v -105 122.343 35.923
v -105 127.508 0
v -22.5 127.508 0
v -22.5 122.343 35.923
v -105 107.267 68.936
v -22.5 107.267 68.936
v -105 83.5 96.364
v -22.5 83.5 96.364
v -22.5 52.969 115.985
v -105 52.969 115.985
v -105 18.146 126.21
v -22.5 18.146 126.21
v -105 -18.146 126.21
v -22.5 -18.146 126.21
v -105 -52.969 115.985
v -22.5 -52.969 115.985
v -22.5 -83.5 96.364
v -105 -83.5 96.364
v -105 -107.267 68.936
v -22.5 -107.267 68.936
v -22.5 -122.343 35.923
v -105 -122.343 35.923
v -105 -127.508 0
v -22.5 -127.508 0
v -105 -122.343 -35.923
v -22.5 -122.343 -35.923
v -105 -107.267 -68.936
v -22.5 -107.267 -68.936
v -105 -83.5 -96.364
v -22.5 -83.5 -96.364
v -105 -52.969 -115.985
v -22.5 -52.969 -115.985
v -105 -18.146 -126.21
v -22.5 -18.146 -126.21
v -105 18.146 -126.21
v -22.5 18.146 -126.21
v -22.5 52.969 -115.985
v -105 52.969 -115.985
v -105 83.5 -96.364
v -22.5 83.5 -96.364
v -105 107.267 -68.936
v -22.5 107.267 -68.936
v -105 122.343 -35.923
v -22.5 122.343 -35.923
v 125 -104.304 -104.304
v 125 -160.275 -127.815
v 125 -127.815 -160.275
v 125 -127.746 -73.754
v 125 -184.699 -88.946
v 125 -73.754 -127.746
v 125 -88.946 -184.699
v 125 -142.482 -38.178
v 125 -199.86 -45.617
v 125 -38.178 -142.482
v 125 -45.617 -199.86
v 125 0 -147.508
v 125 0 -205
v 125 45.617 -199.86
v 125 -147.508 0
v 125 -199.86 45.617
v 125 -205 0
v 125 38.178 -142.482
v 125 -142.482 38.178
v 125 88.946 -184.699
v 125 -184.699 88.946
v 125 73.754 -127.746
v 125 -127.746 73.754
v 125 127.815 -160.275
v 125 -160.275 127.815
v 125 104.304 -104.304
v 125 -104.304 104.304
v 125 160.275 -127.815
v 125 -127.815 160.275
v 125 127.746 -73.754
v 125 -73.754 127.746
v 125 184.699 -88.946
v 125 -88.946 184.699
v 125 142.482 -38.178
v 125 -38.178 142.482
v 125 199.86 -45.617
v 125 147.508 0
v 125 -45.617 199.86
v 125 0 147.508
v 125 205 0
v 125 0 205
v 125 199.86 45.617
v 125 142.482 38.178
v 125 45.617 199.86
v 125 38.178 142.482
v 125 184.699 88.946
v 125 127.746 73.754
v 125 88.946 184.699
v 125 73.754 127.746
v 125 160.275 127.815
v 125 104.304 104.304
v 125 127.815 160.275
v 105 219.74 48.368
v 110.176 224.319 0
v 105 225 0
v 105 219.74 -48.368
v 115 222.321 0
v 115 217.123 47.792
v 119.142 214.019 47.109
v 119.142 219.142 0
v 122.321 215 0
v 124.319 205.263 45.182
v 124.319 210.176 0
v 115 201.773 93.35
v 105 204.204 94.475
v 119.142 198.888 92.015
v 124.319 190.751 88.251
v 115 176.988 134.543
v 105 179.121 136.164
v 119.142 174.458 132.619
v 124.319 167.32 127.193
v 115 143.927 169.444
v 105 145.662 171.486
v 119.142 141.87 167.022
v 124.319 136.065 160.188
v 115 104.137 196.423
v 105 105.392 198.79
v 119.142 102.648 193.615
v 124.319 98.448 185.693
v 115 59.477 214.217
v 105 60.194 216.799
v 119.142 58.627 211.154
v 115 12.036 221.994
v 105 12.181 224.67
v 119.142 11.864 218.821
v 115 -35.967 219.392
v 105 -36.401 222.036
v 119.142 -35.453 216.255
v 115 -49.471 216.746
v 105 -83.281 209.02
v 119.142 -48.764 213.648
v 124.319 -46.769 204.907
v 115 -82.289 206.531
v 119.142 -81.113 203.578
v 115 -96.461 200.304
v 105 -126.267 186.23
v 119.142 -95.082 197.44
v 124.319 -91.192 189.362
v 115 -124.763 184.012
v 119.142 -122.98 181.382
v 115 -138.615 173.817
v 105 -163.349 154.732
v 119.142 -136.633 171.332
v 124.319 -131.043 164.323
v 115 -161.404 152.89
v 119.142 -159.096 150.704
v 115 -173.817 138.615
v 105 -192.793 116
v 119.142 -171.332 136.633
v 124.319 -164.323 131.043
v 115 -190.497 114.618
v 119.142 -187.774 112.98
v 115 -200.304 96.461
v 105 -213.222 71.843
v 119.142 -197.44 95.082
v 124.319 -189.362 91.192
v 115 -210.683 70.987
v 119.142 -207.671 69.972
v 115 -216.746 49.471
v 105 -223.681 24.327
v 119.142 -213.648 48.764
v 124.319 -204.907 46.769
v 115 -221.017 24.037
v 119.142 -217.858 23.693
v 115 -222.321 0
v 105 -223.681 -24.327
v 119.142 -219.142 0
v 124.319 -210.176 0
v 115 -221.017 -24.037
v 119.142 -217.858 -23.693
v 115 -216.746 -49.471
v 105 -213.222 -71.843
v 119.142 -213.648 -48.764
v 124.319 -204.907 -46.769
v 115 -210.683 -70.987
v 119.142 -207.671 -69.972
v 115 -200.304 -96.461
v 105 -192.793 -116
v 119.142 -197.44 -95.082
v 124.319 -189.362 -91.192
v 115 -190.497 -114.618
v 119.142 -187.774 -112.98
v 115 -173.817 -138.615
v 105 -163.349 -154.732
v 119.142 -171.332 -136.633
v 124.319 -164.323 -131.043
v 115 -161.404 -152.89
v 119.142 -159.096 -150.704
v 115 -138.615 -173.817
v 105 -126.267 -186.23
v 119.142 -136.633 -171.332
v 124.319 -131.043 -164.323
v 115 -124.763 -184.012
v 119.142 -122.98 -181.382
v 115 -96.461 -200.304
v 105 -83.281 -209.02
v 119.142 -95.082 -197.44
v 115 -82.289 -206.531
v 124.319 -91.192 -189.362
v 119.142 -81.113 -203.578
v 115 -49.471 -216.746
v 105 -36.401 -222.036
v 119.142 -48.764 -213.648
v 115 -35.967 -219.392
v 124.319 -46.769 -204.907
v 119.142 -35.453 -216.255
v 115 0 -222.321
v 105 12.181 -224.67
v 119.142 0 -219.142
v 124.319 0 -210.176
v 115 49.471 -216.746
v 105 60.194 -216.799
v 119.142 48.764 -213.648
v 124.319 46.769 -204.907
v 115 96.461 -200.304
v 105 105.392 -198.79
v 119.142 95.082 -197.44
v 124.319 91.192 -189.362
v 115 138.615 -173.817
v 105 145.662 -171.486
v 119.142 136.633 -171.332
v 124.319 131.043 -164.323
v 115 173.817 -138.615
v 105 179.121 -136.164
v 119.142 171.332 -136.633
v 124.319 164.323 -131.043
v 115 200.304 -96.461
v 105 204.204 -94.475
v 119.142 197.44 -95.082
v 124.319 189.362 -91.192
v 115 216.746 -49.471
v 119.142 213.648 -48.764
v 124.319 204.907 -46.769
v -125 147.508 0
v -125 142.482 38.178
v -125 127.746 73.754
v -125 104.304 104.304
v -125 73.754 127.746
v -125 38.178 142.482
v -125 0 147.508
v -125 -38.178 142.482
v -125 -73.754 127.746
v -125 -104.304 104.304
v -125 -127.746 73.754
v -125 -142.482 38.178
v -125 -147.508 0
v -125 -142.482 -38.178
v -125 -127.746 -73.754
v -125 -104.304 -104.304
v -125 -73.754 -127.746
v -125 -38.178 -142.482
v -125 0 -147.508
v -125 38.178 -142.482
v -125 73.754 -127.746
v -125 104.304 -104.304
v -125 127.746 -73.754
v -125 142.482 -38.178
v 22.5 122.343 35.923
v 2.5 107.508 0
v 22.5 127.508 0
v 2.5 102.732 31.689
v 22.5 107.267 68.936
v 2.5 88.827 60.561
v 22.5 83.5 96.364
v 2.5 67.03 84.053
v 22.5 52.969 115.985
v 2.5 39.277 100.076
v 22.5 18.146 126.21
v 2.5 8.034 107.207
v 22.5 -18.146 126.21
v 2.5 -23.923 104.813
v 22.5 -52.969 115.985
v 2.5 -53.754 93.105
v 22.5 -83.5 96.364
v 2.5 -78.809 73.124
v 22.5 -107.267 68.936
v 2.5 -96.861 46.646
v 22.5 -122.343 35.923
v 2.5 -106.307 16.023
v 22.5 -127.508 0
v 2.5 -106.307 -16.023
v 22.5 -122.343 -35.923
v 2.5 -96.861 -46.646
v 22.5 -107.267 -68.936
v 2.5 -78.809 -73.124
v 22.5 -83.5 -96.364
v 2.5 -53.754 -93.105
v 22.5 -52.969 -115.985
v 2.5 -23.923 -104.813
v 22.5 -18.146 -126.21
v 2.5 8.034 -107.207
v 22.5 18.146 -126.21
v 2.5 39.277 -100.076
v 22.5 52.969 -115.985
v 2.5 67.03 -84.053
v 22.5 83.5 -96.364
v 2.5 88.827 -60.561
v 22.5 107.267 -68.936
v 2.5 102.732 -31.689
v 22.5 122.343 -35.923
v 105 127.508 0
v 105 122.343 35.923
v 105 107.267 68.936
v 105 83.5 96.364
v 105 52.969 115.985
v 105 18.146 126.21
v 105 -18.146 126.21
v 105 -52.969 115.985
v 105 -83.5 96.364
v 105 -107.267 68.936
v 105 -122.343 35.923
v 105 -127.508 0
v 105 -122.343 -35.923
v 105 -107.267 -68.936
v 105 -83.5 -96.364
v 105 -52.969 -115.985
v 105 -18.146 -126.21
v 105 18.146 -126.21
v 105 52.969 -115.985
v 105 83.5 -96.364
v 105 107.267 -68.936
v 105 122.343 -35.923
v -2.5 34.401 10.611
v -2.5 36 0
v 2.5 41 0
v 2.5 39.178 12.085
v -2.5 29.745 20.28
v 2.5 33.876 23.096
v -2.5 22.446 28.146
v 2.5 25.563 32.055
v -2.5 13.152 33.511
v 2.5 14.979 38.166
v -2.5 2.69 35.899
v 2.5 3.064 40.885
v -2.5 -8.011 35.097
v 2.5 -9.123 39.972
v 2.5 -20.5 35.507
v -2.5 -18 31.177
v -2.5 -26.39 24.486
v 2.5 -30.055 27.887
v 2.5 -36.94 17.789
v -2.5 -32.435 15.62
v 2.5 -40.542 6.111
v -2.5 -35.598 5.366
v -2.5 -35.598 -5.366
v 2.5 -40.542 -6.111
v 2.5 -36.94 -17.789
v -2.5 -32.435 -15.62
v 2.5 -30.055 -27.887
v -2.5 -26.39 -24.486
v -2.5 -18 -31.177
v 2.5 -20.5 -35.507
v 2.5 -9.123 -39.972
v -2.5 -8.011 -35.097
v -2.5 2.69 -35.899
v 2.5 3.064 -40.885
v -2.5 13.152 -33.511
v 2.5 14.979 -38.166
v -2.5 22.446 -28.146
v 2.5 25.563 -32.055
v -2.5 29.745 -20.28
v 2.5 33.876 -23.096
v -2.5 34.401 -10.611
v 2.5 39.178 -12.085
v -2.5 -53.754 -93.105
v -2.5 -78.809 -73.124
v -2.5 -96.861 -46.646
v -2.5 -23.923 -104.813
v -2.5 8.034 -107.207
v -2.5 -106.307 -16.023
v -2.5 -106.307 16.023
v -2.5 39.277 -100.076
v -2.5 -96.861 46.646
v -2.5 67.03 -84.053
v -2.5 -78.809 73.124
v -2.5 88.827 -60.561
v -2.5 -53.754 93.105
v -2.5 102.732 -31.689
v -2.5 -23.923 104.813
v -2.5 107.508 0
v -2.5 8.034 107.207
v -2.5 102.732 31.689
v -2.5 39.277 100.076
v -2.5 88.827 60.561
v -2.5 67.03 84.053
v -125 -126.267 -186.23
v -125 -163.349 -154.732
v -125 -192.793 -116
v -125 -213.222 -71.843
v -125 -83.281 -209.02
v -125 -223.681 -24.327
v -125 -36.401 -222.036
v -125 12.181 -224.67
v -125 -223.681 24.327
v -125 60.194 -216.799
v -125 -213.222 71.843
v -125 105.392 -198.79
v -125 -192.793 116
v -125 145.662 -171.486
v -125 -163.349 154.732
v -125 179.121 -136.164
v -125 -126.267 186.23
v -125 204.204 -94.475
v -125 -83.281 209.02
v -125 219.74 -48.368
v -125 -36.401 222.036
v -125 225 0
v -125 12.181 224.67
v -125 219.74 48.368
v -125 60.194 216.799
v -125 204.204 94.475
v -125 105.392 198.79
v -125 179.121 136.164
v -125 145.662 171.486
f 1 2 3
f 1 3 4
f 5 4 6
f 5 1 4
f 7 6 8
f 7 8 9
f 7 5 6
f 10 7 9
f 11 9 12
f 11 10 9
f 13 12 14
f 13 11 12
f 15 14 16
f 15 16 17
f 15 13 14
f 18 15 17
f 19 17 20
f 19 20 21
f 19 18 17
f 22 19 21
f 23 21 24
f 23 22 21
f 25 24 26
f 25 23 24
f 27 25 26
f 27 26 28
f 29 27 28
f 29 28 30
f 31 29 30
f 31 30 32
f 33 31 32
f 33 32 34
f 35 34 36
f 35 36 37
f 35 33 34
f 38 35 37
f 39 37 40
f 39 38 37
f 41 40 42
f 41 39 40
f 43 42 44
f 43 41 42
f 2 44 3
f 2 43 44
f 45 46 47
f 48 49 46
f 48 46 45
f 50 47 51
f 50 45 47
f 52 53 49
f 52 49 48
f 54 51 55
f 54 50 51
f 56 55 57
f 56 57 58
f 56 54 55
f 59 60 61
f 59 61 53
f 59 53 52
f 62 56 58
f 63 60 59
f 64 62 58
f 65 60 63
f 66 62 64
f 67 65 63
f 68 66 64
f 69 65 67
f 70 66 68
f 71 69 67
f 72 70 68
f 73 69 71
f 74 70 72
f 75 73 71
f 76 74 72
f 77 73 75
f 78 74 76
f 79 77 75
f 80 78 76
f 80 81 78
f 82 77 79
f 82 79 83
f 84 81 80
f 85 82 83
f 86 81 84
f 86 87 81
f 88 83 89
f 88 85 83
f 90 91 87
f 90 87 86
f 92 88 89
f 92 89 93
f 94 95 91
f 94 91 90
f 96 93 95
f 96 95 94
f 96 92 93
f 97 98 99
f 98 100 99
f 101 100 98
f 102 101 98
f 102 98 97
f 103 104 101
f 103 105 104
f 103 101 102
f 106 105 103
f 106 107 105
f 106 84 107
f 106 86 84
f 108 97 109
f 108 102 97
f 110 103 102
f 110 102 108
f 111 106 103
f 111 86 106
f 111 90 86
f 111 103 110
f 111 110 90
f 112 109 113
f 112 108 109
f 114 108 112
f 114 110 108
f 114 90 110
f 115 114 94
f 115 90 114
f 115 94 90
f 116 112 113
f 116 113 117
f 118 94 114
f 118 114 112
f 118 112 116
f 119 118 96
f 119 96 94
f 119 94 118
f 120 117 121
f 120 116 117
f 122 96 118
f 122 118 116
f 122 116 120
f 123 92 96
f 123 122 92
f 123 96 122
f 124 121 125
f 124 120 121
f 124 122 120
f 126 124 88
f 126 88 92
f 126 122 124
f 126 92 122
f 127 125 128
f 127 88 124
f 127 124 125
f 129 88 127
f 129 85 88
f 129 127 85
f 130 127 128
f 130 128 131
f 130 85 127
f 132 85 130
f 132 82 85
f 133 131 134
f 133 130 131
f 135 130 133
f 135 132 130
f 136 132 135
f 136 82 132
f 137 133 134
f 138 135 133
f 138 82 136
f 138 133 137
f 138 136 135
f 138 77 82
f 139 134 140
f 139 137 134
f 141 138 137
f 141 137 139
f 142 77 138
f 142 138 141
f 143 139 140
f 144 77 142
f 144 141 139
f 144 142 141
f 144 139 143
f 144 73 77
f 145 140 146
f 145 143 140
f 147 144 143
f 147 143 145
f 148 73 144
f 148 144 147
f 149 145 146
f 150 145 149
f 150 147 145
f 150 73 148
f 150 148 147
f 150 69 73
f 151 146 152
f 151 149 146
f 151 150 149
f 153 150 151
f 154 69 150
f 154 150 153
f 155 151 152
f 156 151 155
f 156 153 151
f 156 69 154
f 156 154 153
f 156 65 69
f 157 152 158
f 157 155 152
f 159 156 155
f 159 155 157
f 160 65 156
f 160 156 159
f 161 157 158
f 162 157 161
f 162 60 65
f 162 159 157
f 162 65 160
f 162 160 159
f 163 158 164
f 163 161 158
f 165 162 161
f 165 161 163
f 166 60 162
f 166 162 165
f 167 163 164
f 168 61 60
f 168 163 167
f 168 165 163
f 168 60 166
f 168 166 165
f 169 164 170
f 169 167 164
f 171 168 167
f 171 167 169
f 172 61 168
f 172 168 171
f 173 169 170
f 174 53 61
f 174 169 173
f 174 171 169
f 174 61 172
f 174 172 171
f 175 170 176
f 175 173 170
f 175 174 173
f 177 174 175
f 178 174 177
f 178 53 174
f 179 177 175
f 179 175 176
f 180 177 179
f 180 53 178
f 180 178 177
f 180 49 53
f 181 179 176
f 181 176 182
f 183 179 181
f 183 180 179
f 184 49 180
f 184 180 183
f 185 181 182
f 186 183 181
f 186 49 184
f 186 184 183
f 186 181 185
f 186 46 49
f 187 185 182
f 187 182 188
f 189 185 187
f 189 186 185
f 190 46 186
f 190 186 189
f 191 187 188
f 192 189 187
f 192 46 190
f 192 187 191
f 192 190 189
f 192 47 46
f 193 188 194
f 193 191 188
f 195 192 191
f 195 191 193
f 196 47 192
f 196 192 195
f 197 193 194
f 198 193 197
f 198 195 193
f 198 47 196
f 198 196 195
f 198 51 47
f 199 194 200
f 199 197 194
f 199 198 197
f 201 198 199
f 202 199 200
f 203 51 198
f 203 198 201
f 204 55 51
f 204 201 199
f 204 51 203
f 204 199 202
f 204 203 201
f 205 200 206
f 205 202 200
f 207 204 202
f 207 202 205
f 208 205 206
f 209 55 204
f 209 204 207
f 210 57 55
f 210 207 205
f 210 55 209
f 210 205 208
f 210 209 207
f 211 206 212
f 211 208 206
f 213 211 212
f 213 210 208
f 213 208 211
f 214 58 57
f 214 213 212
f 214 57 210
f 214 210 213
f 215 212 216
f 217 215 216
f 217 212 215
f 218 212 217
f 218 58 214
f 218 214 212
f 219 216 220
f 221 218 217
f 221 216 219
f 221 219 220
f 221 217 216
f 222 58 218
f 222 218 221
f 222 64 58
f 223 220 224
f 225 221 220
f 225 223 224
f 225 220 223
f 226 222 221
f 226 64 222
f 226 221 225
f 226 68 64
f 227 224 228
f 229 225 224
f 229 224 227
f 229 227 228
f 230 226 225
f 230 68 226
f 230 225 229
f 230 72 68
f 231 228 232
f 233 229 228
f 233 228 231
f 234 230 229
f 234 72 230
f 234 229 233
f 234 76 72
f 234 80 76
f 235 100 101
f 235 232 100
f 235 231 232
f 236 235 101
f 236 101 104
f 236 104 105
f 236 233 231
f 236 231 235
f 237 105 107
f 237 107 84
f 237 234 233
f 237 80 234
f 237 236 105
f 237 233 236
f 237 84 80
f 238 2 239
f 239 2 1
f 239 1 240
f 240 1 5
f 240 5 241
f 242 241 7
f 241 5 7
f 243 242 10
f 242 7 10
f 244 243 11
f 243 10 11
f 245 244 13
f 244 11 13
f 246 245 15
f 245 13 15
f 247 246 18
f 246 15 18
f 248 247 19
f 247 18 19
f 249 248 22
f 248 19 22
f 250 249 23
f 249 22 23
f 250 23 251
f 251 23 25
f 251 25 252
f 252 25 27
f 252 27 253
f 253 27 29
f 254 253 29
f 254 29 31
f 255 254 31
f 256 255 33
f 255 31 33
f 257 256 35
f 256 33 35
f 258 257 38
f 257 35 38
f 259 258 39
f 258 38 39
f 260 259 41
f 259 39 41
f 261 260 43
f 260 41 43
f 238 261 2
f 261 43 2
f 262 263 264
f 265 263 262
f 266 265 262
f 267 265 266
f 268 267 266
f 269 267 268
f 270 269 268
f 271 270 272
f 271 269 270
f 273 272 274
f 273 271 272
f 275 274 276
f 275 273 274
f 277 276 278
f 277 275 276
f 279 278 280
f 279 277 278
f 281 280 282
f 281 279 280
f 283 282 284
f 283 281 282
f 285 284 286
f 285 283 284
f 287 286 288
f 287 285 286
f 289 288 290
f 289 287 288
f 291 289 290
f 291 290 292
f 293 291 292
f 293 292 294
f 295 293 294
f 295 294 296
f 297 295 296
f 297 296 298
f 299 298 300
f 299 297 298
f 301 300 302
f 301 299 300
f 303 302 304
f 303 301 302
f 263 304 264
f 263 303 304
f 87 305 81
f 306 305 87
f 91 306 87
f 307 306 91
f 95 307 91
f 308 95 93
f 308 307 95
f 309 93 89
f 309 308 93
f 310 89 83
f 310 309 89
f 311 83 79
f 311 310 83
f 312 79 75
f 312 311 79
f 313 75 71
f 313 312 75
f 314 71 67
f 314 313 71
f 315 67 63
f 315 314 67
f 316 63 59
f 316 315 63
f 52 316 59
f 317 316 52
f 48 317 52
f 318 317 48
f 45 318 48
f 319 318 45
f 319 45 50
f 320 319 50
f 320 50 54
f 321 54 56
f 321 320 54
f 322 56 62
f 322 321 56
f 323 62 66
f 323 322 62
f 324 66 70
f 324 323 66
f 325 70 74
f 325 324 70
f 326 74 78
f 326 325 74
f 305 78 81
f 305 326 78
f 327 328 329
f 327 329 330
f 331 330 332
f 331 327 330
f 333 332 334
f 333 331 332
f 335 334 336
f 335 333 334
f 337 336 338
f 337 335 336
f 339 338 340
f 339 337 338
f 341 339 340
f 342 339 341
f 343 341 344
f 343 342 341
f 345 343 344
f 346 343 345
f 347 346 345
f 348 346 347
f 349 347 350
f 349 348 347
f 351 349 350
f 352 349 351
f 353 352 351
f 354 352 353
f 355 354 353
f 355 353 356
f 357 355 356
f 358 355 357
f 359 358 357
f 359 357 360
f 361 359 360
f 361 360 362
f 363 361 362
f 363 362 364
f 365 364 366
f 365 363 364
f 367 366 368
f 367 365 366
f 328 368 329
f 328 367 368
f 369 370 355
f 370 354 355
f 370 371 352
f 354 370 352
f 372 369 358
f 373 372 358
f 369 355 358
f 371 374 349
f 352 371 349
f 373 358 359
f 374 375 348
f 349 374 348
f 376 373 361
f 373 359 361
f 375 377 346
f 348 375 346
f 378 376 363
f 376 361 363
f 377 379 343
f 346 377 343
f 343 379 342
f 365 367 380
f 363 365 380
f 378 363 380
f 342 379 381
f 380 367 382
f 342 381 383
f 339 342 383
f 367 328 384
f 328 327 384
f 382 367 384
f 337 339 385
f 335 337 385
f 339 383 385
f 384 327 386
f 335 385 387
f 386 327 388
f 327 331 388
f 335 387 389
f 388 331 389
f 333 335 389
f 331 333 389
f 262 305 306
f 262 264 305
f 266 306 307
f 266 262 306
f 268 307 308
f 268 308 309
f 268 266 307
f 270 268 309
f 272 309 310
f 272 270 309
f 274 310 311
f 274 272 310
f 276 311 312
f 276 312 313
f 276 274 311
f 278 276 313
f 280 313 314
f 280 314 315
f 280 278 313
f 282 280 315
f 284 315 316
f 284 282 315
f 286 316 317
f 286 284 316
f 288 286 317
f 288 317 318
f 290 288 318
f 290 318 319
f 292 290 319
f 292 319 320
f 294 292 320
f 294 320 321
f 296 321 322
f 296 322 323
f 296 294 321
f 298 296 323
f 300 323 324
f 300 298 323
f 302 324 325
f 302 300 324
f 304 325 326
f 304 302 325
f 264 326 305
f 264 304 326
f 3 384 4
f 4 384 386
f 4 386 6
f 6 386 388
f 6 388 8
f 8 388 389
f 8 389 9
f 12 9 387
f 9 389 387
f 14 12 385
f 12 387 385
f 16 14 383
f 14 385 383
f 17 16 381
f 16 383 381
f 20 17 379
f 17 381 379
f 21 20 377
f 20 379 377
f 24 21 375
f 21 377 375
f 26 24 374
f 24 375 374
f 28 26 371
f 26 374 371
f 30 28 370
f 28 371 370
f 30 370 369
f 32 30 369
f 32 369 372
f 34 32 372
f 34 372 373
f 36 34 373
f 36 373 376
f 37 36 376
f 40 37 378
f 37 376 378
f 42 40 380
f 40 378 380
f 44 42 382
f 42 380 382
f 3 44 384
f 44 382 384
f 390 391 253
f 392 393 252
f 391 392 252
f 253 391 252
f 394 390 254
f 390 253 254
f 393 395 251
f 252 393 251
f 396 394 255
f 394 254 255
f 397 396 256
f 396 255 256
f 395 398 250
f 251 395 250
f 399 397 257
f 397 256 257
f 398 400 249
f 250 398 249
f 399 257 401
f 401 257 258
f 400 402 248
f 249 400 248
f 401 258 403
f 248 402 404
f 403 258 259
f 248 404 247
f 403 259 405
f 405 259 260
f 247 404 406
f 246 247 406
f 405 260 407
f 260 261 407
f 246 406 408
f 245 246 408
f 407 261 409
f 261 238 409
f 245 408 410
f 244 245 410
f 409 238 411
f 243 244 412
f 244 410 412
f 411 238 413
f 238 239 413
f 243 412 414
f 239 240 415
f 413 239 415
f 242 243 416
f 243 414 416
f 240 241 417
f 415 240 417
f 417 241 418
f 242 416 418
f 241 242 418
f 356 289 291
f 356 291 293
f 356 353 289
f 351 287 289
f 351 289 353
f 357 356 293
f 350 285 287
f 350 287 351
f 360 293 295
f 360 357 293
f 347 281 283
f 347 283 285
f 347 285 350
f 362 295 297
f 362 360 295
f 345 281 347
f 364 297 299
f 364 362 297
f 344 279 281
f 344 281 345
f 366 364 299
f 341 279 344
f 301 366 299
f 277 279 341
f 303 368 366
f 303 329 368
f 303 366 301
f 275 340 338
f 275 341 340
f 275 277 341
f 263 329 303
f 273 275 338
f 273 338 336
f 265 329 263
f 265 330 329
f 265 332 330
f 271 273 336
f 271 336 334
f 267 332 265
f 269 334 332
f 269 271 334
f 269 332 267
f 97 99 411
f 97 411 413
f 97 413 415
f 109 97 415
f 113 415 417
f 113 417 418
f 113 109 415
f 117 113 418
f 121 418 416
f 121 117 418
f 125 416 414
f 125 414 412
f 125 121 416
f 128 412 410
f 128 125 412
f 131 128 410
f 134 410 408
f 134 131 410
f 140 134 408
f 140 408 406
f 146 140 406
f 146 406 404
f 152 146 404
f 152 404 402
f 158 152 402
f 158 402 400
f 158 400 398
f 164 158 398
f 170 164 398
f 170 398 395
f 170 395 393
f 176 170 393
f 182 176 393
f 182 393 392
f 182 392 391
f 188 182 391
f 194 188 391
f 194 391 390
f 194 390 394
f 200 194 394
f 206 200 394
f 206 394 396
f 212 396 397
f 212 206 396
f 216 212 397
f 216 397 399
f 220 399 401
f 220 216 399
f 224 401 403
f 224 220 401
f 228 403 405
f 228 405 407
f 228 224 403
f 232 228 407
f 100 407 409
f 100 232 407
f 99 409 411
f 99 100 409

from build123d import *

# Parameters (mm, degrees)
F0_R     = 225
F0_R_2   = 127.5080178576
F1_DEPTH = 125
F0_R_3   = 21
F2_DEPTH = 2.5
F3_R     = 20


# Not quite as in the source:
# - a fillet or chamfer that OpenCascade refuses, or shapes differently, is made with other operations: its cross-section is extruded or revolved along the edge and cut away or added


with BuildPart() as f1:
    # F0 (on Right) → F1 (new body, symmetric)
    with BuildSketch(Plane.YZ):
        Circle(F0_R)
        Circle(F0_R_2, mode=Mode.SUBTRACT)
    extrude(amount=F1_DEPTH, both=True)

    # F0 (on Right) → F2 (join, symmetric)
    with BuildSketch(Plane.YZ):
        Circle(F0_R_2)
        Circle(F0_R_3, mode=Mode.SUBTRACT)
    extrude(amount=F2_DEPTH, both=True)

    # F3
    f3_edges = [f1.edges().sort_by_distance(p)[0] for p in [
        (125, -225, 0),
    ]]
    fillet(f3_edges, radius=F3_R)

    # F4: chamfer of 20 on 5 edges, made by hand

    # F4_s1 → F4_t2 (revolve)
    with BuildSketch(Plane.XY):
        Polygon((-22.5, 127.5080178576), (-2.5, 107.5080178576), (-2.5, 127.5080178576), align=None)
    revolve(axis=Axis((-2.5, 0, 0), (1, 0, 0)))

    # F4_s3 → F4_t4 (revolve)
    with BuildSketch(Plane.XY):
        Polygon((22.5, 127.5080178576), (2.5, 107.5080178576), (2.5, 127.5080178576), align=None)
    revolve(axis=Axis((2.5, 0, 0), (1, 0, 0)))

    # F4_s5 → F4_t6 (revolve, cut)
    with BuildSketch(Plane.XY):
        Polygon((-125, 147.5080178576), (-105, 127.5080178576), (-125, 127.5080178576), align=None)
    revolve(axis=Axis((-125, 0, 0), (1, 0, 0)), mode=Mode.SUBTRACT)

    # F4_s7 → F4_t8 (revolve, cut)
    with BuildSketch(Plane.XY):
        Polygon((125, 147.5080178576), (105, 127.5080178576), (125, 127.5080178576), align=None)
    revolve(axis=Axis((125, 0, 0), (1, 0, 0)), mode=Mode.SUBTRACT)

    # F4_s9 → F4_t10 (revolve, cut)
    with BuildSketch(Plane.XY):
        Polygon((2.5, 41), (-17.5, 21), (2.5, 21), align=None)
    revolve(axis=Axis((2.5, 0, 0), (1, 0, 0)), mode=Mode.SUBTRACT)


solid = f1.part
